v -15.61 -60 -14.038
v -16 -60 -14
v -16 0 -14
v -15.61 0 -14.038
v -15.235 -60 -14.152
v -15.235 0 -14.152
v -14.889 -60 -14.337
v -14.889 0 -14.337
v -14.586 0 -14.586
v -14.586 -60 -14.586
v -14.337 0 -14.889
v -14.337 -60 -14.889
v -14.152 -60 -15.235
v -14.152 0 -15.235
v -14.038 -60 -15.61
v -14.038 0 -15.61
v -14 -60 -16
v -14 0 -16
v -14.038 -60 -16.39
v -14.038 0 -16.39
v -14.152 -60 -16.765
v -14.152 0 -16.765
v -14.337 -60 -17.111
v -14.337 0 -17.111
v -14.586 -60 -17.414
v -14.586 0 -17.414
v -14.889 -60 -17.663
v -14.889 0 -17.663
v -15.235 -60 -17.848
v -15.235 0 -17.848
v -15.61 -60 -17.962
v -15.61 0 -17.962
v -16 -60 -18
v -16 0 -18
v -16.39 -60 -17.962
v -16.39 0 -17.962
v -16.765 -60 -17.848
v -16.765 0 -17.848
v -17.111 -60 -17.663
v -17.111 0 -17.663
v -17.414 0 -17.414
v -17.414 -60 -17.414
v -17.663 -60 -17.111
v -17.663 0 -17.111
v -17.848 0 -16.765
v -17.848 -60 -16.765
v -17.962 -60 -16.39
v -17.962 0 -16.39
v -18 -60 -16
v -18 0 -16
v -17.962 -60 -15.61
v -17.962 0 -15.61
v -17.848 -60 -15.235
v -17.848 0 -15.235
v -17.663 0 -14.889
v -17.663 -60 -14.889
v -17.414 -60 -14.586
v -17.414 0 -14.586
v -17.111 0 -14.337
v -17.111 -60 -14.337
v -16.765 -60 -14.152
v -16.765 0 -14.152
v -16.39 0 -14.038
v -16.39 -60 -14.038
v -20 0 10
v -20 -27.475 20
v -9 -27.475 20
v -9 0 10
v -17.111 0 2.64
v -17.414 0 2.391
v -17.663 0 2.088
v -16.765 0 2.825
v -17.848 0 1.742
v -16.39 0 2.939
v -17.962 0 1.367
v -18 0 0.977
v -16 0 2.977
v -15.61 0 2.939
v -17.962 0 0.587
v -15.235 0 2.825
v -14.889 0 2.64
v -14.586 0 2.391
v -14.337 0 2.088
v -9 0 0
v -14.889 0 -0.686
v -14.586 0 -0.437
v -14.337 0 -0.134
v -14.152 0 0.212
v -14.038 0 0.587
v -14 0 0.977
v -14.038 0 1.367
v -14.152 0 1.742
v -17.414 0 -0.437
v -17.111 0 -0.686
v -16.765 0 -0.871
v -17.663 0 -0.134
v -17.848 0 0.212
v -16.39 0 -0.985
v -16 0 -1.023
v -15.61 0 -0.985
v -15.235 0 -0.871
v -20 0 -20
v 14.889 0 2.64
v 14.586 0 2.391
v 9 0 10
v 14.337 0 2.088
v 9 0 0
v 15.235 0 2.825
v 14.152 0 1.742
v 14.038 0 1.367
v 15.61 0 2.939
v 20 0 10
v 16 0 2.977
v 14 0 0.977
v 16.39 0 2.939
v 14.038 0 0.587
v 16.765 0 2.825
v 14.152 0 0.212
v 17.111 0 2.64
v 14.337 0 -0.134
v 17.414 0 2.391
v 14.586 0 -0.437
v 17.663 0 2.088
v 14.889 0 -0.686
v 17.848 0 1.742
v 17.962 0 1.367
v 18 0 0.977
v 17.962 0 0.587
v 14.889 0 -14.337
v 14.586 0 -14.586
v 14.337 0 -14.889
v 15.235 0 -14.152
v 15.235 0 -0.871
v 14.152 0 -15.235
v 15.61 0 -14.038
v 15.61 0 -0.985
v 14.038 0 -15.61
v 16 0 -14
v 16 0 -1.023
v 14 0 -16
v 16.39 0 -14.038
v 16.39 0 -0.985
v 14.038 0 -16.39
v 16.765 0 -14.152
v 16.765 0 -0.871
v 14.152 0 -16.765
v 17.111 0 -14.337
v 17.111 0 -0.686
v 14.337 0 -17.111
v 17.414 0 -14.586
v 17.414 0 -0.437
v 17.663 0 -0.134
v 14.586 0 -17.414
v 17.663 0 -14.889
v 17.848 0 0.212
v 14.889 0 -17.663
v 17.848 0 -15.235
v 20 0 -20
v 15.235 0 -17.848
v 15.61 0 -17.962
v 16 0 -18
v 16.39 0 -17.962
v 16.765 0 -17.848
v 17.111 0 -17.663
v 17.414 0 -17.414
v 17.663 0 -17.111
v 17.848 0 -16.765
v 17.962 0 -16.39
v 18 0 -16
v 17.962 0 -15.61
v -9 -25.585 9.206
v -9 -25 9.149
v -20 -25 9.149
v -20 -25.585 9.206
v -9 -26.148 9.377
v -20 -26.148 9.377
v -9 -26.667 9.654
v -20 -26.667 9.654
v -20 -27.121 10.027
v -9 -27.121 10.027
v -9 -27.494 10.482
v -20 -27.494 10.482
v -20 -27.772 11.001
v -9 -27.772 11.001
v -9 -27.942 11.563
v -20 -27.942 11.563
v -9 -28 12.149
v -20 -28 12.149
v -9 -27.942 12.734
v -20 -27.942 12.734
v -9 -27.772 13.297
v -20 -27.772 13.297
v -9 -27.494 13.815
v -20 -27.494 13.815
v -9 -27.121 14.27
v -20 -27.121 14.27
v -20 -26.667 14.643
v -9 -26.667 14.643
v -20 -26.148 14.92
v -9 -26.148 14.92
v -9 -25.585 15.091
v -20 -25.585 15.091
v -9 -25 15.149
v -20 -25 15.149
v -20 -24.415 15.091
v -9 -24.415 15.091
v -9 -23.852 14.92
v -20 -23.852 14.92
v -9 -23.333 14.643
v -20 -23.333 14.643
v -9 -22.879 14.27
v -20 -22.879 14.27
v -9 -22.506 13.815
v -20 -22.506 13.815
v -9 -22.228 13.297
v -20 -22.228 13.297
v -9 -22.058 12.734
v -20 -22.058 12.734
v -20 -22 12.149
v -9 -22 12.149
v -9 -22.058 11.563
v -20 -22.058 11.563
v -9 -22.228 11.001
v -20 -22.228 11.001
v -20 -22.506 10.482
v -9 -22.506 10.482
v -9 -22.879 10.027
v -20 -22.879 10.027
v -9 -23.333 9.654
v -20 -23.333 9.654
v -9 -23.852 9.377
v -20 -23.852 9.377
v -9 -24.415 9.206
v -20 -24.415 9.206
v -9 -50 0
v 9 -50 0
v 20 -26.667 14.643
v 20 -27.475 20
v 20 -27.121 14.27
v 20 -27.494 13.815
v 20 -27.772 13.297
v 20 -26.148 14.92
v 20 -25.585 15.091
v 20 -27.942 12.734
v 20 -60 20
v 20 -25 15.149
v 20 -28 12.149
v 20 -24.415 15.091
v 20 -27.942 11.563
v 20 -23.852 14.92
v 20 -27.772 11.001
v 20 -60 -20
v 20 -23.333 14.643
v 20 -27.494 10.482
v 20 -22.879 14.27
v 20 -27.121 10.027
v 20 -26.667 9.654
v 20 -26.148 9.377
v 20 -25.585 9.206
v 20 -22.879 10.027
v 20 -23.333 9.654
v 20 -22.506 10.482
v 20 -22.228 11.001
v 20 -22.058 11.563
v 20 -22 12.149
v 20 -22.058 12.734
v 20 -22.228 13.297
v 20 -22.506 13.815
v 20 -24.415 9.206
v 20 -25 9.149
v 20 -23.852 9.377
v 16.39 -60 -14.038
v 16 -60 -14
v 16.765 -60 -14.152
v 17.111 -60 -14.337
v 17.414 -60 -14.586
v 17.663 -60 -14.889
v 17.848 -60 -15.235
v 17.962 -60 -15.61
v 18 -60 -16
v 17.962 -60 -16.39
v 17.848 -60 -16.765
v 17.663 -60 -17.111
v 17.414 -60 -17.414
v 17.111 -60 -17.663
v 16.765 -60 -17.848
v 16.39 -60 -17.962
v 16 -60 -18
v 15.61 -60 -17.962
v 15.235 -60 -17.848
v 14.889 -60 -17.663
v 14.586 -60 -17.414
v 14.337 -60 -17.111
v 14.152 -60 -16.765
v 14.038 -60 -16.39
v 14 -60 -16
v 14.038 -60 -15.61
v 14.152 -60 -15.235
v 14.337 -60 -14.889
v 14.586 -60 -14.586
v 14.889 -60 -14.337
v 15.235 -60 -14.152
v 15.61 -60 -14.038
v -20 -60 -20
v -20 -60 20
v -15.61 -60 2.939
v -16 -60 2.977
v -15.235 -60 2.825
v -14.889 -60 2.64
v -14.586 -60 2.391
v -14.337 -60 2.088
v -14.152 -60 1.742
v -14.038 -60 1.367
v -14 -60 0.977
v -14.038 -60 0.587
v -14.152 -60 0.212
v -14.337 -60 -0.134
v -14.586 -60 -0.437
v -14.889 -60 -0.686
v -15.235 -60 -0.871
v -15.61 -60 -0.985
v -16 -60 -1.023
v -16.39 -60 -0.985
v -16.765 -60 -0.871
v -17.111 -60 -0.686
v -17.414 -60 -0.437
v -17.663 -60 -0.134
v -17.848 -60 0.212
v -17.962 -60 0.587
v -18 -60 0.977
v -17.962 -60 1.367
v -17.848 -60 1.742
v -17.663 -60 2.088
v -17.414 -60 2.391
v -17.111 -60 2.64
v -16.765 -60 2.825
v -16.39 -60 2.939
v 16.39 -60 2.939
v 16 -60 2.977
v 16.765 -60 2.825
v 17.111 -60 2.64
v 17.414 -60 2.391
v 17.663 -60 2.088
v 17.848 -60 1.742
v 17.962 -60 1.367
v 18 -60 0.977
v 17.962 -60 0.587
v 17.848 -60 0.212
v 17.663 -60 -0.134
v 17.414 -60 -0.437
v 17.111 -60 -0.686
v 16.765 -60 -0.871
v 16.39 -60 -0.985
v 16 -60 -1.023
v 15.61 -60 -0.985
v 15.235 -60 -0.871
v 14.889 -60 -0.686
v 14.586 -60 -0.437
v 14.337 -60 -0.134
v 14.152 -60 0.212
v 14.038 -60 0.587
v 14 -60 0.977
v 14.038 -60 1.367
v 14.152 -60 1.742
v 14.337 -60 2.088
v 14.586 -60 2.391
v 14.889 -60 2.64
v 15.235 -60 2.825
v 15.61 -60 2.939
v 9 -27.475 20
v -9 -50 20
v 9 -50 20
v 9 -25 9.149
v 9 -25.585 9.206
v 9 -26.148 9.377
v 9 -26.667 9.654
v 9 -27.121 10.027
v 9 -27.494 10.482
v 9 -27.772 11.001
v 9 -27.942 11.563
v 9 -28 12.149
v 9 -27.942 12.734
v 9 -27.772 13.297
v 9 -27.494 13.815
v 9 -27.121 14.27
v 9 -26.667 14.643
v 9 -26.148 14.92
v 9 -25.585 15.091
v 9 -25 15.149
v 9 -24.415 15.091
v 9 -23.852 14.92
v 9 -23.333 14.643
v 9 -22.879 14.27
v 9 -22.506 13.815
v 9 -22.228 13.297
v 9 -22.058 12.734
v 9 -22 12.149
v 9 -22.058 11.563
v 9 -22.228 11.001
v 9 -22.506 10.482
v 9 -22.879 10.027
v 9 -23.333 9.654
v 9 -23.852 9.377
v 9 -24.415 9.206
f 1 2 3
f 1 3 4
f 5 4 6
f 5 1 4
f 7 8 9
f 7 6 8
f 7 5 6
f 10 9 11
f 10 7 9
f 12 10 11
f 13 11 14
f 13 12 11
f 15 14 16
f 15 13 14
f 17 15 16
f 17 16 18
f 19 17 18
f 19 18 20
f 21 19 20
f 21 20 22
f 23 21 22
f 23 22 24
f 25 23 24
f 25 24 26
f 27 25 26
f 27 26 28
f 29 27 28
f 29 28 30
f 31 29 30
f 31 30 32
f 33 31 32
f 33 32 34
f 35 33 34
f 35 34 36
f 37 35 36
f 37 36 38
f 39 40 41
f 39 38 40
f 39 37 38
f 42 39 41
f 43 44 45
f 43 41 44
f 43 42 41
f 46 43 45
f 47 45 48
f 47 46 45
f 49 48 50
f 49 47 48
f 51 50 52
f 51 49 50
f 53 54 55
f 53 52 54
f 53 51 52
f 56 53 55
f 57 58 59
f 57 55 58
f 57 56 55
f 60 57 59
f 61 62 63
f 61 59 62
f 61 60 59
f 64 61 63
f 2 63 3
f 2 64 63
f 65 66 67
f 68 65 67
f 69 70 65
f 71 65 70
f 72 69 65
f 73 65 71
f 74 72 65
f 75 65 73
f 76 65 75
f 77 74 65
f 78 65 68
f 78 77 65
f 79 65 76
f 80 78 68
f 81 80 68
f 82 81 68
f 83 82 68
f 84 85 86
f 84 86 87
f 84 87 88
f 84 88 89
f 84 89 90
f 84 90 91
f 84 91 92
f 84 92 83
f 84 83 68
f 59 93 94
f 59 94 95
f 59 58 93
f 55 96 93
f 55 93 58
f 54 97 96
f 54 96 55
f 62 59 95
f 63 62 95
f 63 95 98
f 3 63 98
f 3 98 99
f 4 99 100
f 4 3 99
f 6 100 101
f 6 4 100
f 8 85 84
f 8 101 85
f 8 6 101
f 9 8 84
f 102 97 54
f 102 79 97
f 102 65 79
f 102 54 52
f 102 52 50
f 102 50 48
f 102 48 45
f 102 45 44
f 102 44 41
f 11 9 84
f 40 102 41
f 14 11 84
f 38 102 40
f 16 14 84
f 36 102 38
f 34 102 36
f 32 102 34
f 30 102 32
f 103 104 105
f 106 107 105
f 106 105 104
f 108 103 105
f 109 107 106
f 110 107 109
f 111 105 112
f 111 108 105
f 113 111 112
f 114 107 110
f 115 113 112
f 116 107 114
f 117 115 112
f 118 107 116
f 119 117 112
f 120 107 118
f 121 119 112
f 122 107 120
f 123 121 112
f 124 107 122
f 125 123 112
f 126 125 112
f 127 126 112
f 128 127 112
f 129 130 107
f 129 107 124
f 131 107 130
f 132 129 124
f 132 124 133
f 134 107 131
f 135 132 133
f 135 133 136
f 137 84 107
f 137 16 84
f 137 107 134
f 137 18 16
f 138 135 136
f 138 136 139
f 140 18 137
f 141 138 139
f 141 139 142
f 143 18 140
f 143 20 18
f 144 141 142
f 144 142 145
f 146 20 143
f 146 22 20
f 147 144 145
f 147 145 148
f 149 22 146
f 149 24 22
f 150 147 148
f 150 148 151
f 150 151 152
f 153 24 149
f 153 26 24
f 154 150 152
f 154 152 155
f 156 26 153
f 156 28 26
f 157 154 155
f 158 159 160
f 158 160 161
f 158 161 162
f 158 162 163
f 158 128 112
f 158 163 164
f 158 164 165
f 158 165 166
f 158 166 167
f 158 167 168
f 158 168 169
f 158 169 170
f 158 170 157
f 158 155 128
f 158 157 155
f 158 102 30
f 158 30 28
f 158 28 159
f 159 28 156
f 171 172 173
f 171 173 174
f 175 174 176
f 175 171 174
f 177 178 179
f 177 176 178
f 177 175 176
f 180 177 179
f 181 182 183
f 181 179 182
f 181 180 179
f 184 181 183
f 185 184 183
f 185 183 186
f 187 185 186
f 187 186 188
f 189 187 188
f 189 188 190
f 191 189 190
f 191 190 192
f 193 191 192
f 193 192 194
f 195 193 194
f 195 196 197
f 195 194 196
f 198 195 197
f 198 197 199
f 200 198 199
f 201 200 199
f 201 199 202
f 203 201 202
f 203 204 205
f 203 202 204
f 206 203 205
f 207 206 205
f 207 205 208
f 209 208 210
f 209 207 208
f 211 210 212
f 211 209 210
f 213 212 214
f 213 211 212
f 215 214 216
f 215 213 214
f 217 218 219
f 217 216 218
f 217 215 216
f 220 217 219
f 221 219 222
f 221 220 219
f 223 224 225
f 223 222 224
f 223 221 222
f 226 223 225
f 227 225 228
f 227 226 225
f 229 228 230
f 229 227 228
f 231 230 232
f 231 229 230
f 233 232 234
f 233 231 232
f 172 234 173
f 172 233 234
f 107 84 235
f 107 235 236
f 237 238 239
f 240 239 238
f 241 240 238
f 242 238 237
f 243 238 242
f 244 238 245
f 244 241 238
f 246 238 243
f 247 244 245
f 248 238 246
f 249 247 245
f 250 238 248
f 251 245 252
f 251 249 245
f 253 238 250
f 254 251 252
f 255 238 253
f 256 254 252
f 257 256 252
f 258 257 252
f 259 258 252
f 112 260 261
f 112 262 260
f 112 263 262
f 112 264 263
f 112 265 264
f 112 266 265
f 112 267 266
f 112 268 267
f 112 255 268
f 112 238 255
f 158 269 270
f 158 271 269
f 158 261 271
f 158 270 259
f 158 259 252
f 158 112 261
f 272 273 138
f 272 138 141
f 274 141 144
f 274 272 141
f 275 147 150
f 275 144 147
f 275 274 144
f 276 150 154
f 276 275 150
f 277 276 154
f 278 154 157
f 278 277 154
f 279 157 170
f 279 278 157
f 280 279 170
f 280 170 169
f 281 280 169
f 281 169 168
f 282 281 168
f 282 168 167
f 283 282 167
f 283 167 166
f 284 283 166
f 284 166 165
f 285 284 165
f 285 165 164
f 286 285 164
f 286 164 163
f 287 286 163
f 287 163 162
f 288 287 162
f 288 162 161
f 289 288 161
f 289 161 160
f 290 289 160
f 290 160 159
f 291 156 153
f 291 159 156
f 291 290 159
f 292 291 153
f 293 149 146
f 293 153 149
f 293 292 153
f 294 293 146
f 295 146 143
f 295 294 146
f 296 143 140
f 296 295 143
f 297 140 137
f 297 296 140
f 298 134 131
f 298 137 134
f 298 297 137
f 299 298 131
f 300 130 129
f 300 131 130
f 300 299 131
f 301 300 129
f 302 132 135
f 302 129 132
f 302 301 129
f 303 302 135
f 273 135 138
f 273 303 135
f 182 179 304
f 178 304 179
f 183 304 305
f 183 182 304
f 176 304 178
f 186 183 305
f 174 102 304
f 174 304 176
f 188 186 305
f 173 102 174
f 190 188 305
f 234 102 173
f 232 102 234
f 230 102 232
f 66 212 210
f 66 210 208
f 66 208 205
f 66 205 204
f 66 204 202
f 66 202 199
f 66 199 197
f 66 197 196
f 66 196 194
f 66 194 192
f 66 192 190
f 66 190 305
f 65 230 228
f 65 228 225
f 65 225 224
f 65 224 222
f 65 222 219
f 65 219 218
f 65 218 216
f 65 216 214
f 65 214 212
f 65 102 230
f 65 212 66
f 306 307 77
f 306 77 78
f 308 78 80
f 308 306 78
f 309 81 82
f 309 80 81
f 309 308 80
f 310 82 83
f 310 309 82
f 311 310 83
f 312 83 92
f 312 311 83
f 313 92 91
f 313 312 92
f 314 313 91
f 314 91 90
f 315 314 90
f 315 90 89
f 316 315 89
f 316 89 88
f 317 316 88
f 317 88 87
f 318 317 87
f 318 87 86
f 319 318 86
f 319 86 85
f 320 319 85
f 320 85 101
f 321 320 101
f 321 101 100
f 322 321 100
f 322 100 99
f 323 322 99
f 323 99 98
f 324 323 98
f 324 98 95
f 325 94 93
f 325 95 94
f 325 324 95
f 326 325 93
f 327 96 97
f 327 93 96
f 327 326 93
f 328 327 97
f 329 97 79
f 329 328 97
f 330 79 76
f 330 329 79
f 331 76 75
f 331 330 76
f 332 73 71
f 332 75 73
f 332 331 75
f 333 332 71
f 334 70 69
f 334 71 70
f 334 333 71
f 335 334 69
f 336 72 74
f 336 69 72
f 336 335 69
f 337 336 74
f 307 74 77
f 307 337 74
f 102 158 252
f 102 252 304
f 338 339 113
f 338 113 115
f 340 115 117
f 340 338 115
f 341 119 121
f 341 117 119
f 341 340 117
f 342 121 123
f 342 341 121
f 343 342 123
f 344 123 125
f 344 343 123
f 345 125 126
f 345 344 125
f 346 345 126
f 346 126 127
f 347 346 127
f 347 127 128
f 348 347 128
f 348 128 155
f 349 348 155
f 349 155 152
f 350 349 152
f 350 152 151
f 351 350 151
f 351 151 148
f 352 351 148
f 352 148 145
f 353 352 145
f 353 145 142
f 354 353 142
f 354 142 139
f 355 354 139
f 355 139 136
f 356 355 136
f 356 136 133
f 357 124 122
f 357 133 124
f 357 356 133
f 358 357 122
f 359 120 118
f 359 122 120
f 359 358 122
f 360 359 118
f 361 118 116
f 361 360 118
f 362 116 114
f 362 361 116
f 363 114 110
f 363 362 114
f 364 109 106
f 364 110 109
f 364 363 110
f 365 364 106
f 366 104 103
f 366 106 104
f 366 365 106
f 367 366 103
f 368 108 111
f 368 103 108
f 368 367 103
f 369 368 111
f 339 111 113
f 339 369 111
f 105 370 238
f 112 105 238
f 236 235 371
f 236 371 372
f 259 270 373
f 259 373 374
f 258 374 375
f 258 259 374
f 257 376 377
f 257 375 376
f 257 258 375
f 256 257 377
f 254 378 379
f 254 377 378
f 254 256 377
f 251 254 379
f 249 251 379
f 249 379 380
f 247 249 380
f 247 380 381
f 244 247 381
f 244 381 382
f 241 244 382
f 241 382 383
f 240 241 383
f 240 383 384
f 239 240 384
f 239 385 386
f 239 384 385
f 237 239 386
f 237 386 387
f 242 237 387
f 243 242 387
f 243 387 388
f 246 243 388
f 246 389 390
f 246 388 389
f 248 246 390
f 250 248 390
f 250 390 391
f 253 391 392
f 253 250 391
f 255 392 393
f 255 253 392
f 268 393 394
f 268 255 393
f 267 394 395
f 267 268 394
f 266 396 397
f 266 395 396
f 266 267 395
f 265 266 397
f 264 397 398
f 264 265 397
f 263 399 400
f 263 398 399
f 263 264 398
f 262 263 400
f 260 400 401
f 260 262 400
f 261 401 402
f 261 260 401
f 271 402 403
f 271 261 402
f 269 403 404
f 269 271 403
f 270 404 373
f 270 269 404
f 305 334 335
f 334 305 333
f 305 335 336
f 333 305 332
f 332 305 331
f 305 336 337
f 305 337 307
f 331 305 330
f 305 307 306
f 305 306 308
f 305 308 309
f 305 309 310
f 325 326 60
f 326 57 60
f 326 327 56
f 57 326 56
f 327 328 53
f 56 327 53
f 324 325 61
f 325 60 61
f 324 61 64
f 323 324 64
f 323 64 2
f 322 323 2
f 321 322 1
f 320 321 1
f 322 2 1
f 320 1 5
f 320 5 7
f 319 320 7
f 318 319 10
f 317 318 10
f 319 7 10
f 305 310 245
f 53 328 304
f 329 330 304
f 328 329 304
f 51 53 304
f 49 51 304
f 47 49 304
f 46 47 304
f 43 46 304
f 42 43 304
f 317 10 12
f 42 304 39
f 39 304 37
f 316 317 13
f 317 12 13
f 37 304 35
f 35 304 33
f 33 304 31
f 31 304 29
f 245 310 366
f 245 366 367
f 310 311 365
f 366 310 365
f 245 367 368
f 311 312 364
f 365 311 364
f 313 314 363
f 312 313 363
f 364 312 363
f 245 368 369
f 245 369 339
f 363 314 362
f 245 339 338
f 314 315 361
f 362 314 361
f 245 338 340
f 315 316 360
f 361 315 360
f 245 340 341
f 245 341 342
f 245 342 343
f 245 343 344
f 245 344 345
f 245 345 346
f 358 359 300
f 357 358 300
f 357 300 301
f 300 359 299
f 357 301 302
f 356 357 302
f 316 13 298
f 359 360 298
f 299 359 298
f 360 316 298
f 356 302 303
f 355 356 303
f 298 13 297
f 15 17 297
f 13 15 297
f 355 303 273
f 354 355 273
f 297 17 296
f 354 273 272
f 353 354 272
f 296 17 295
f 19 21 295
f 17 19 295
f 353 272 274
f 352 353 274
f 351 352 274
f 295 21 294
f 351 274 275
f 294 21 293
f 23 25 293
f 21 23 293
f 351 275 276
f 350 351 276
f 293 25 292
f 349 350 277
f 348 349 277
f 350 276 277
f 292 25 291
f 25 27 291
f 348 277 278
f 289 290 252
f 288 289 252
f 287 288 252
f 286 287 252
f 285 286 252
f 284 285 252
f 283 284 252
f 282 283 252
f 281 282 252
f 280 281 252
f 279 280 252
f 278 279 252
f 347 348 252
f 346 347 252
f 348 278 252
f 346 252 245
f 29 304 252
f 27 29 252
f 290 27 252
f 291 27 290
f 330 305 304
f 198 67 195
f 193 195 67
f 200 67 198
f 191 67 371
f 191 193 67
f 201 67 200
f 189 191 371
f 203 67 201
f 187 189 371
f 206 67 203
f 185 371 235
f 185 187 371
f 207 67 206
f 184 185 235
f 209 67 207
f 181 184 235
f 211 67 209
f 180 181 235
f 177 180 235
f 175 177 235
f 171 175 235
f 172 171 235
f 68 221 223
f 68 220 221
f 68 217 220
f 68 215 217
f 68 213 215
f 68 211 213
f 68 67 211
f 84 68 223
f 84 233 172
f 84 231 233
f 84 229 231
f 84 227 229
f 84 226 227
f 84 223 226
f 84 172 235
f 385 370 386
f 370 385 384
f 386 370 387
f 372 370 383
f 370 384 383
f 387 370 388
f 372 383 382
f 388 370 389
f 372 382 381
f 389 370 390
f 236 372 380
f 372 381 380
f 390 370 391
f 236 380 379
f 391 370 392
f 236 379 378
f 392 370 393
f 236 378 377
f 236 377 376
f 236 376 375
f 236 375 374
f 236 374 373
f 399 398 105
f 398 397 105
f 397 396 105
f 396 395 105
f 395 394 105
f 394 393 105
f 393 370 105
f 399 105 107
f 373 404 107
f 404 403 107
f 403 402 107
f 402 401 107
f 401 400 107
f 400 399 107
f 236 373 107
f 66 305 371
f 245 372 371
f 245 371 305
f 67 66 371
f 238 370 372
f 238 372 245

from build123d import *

# Parameters (mm, degrees)
SKETCH1_W               = 40
SKETCH1_H               = 40
BOSS_EXTRUDE1_DEPTH     = 60
SKETCH1_3_W             = 18
SKETCH1_3_H             = 20
CUT_EXTRUDE1_DEPTH      = 50
CUT_EXTRUDE3_DEPTH      = 28
CUT_EXTRUDE3_DEPTH_BACK = 70
SKETCH4_R               = 2
CUT_EXTRUDE4_DEPTH      = 57
CUT_EXTRUDE4_DEPTH_BACK = 57
SKETCH5_R               = 3
CHAMFER1_SIZE           = 10
CHAMFER1_SIZE2          = 27.474774195


with BuildPart() as part:
    # Sketch1 → Boss-Extrude1 (new body)
    with BuildSketch(Plane(origin=(0, 0, 0), x_dir=(1, 0, 0), z_dir=(0, 1, 0))):
        Rectangle(SKETCH1_W, SKETCH1_H)
    extrude(amount=-BOSS_EXTRUDE1_DEPTH)

    # Sketch1<3> → Cut-Extrude1 (cut)
    with BuildSketch(Plane(origin=(0, 0, 0), x_dir=(1, 0, 0), z_dir=(0, 1, 0))):
        with Locations((0, -10)):
            Rectangle(SKETCH1_3_W, SKETCH1_3_H)
    extrude(amount=-CUT_EXTRUDE1_DEPTH, mode=Mode.SUBTRACT)

    # Sketch4 → Cut-Extrude3 (cut, two sides: drawn at the far end of the back side and taken through both)
    with BuildSketch(Plane(origin=(0, 0, 0), x_dir=(1, 0, 0), z_dir=(0, 1, 0)).offset(-CUT_EXTRUDE3_DEPTH_BACK)):
        with Locations((-16, 16)):
            Circle(SKETCH4_R)
        with Locations((16, 16)):
            Circle(SKETCH4_R)
        with Locations((16, -0.977001598)):
            Circle(SKETCH4_R)
        with Locations((-16, -0.977001598)):
            Circle(SKETCH4_R)
    extrude(amount=CUT_EXTRUDE3_DEPTH + CUT_EXTRUDE3_DEPTH_BACK, mode=Mode.SUBTRACT)

    # Sketch5 → Cut-Extrude4 (cut, two sides: drawn at the far end of the back side and taken through both)
    with BuildSketch(Plane.ZY.offset(-9).offset(-CUT_EXTRUDE4_DEPTH_BACK)):
        with Locations((12.148726145, -25)):
            Circle(SKETCH5_R)
    extrude(amount=CUT_EXTRUDE4_DEPTH + CUT_EXTRUDE4_DEPTH_BACK, mode=Mode.SUBTRACT)

    # Chamfer1
    chamfer1_edges = [part.edges().sort_by_distance(p)[0] for p in [
        (14.5, 0, 20),
        (-14.5, 0, 20),
    ]]
    chamfer1_side = [part.faces().sort_by_distance(p)[0] for p in [
        (0, 0, -2.708529358),
    ]]
    chamfer(chamfer1_edges, length=CHAMFER1_SIZE, length2=CHAMFER1_SIZE2, reference=chamfer1_side[0])


solid = part.part
